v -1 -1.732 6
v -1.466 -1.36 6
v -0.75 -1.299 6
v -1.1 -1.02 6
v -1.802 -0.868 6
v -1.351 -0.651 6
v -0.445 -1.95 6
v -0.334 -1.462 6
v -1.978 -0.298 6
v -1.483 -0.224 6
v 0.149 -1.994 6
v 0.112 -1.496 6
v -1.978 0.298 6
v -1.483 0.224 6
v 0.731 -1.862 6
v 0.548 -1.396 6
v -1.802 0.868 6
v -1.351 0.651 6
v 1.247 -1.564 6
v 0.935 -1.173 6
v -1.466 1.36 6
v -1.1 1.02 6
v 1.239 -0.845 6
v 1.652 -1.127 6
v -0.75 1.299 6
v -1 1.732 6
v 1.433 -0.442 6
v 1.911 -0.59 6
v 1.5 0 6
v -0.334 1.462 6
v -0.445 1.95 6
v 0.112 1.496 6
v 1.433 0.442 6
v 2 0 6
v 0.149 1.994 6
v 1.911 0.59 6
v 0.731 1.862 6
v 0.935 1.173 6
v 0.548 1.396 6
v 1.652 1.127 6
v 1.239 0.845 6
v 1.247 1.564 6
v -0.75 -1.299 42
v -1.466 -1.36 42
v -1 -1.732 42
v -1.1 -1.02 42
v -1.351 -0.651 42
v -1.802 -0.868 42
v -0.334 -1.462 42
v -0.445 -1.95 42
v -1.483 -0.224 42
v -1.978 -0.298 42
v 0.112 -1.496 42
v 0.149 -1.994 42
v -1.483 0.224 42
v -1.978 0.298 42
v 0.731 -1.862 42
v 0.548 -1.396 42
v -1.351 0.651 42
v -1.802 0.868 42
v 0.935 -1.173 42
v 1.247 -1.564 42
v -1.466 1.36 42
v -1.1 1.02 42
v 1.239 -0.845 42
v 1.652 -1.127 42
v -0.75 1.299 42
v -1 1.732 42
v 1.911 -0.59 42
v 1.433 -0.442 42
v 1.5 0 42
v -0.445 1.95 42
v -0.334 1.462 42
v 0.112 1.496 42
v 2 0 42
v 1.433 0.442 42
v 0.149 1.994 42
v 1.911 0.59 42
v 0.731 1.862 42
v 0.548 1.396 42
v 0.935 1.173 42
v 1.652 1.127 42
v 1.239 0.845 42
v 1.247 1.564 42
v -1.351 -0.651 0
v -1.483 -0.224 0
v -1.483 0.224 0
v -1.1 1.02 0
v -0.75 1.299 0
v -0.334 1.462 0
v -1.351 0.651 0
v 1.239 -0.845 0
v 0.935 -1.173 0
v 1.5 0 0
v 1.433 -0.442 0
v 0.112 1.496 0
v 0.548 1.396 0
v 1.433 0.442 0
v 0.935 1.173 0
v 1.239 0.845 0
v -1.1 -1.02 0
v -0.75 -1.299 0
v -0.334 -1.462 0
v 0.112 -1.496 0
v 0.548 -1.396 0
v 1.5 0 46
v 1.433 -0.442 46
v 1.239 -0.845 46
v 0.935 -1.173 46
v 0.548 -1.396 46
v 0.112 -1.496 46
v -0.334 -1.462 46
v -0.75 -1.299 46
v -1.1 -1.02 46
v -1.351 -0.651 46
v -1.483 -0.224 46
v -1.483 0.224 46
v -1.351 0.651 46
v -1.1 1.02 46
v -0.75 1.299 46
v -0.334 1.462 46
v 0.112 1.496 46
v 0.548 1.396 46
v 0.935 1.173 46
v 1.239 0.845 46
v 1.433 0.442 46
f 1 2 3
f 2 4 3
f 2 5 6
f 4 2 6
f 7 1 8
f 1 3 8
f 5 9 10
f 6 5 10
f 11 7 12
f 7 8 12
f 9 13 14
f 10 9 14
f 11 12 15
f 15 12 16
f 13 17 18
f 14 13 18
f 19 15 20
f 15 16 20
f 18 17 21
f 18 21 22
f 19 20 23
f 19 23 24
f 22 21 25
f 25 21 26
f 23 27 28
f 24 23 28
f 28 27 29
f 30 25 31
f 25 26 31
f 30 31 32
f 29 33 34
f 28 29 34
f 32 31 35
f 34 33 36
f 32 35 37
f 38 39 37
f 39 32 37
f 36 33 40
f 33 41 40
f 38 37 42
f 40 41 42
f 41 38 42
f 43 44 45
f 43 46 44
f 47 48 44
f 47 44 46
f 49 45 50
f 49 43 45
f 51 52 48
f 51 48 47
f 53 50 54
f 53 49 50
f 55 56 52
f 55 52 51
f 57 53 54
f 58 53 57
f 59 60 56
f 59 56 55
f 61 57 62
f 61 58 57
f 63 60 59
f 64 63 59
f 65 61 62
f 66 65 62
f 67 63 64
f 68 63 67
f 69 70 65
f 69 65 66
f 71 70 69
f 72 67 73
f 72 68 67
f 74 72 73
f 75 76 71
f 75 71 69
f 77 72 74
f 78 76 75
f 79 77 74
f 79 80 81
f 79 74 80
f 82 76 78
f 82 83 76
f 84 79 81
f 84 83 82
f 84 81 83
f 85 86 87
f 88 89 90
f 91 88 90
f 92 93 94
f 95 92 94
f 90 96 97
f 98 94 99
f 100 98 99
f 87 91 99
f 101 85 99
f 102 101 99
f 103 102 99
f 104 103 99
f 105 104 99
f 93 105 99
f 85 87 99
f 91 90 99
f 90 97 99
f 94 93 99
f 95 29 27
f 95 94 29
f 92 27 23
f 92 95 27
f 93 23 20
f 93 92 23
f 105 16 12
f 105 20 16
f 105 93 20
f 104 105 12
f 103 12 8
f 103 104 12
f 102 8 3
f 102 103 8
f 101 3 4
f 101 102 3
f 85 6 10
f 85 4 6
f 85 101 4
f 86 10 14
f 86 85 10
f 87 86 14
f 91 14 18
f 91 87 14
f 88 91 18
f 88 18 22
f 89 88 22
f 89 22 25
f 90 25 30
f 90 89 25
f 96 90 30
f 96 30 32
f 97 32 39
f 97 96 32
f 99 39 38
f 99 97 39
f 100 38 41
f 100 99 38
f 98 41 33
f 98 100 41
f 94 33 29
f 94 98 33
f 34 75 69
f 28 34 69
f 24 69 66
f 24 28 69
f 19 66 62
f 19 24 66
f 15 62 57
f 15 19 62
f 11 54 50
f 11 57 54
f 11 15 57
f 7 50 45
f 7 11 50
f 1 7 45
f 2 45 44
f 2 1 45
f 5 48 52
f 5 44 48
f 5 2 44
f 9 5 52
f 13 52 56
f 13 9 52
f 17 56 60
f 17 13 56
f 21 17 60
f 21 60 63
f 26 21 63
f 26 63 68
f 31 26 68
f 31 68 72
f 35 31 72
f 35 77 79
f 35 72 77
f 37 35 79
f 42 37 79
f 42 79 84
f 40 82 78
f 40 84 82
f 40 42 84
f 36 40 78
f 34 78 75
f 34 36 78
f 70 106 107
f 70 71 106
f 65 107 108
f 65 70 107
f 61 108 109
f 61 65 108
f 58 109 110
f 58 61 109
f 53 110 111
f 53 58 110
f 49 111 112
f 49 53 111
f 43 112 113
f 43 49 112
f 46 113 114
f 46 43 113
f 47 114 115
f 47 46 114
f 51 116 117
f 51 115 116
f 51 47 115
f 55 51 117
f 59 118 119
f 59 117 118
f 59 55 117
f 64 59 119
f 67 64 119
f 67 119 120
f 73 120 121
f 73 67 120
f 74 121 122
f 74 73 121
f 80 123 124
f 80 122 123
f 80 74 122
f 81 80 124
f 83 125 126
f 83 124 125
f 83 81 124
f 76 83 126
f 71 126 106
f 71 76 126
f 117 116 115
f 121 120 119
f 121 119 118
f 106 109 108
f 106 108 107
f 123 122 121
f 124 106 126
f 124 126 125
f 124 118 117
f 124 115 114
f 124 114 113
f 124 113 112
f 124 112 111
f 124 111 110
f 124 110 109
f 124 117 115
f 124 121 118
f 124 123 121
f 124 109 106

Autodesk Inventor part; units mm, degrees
ref_plane "YZ Plane" through (0, 0, 0) normal (1, 0, 0) x (0, 1, 0)
ref_plane "XZ Plane" through (0, 0, 0) normal (0, 1, 0) x (-1, 0, 0)
ref_plane "XY Plane" through (0, 0, 0) normal (0, 0, 1) x (1, 0, 0)
sketch "Sketch1" plane through (0, 0, 0) normal (0, 0, 1) x (1, 0, 0)
  circle A0 centre (0, 0) radius 1.5
  dimension "d0" = 3
extrude "Extrusion1" add sketch "Sketch1" along normal blind 6
sketch "Sketch2" plane through (0, 0, 6) normal (0, 0, 1) x (1, 0, 0)
  circle A0 centre (0, 0) radius 2
  dimension "d3" = 4
extrude "Extrusion2" add sketch "Sketch2" along normal blind 36
sketch "Sketch3" plane through (0, 0, 42) normal (0, 0, 1) x (1, 0, 0)
  circle A0 centre (0, 0) radius 1.5
  dimension "d6" = 3
extrude "Extrusion3" add sketch "Sketch3" along normal blind 4
thread "Thread1" size "M3x0.5" class "6g" standard "ANSI Metric M Profile" full length
properties material "Stainless Steel"
